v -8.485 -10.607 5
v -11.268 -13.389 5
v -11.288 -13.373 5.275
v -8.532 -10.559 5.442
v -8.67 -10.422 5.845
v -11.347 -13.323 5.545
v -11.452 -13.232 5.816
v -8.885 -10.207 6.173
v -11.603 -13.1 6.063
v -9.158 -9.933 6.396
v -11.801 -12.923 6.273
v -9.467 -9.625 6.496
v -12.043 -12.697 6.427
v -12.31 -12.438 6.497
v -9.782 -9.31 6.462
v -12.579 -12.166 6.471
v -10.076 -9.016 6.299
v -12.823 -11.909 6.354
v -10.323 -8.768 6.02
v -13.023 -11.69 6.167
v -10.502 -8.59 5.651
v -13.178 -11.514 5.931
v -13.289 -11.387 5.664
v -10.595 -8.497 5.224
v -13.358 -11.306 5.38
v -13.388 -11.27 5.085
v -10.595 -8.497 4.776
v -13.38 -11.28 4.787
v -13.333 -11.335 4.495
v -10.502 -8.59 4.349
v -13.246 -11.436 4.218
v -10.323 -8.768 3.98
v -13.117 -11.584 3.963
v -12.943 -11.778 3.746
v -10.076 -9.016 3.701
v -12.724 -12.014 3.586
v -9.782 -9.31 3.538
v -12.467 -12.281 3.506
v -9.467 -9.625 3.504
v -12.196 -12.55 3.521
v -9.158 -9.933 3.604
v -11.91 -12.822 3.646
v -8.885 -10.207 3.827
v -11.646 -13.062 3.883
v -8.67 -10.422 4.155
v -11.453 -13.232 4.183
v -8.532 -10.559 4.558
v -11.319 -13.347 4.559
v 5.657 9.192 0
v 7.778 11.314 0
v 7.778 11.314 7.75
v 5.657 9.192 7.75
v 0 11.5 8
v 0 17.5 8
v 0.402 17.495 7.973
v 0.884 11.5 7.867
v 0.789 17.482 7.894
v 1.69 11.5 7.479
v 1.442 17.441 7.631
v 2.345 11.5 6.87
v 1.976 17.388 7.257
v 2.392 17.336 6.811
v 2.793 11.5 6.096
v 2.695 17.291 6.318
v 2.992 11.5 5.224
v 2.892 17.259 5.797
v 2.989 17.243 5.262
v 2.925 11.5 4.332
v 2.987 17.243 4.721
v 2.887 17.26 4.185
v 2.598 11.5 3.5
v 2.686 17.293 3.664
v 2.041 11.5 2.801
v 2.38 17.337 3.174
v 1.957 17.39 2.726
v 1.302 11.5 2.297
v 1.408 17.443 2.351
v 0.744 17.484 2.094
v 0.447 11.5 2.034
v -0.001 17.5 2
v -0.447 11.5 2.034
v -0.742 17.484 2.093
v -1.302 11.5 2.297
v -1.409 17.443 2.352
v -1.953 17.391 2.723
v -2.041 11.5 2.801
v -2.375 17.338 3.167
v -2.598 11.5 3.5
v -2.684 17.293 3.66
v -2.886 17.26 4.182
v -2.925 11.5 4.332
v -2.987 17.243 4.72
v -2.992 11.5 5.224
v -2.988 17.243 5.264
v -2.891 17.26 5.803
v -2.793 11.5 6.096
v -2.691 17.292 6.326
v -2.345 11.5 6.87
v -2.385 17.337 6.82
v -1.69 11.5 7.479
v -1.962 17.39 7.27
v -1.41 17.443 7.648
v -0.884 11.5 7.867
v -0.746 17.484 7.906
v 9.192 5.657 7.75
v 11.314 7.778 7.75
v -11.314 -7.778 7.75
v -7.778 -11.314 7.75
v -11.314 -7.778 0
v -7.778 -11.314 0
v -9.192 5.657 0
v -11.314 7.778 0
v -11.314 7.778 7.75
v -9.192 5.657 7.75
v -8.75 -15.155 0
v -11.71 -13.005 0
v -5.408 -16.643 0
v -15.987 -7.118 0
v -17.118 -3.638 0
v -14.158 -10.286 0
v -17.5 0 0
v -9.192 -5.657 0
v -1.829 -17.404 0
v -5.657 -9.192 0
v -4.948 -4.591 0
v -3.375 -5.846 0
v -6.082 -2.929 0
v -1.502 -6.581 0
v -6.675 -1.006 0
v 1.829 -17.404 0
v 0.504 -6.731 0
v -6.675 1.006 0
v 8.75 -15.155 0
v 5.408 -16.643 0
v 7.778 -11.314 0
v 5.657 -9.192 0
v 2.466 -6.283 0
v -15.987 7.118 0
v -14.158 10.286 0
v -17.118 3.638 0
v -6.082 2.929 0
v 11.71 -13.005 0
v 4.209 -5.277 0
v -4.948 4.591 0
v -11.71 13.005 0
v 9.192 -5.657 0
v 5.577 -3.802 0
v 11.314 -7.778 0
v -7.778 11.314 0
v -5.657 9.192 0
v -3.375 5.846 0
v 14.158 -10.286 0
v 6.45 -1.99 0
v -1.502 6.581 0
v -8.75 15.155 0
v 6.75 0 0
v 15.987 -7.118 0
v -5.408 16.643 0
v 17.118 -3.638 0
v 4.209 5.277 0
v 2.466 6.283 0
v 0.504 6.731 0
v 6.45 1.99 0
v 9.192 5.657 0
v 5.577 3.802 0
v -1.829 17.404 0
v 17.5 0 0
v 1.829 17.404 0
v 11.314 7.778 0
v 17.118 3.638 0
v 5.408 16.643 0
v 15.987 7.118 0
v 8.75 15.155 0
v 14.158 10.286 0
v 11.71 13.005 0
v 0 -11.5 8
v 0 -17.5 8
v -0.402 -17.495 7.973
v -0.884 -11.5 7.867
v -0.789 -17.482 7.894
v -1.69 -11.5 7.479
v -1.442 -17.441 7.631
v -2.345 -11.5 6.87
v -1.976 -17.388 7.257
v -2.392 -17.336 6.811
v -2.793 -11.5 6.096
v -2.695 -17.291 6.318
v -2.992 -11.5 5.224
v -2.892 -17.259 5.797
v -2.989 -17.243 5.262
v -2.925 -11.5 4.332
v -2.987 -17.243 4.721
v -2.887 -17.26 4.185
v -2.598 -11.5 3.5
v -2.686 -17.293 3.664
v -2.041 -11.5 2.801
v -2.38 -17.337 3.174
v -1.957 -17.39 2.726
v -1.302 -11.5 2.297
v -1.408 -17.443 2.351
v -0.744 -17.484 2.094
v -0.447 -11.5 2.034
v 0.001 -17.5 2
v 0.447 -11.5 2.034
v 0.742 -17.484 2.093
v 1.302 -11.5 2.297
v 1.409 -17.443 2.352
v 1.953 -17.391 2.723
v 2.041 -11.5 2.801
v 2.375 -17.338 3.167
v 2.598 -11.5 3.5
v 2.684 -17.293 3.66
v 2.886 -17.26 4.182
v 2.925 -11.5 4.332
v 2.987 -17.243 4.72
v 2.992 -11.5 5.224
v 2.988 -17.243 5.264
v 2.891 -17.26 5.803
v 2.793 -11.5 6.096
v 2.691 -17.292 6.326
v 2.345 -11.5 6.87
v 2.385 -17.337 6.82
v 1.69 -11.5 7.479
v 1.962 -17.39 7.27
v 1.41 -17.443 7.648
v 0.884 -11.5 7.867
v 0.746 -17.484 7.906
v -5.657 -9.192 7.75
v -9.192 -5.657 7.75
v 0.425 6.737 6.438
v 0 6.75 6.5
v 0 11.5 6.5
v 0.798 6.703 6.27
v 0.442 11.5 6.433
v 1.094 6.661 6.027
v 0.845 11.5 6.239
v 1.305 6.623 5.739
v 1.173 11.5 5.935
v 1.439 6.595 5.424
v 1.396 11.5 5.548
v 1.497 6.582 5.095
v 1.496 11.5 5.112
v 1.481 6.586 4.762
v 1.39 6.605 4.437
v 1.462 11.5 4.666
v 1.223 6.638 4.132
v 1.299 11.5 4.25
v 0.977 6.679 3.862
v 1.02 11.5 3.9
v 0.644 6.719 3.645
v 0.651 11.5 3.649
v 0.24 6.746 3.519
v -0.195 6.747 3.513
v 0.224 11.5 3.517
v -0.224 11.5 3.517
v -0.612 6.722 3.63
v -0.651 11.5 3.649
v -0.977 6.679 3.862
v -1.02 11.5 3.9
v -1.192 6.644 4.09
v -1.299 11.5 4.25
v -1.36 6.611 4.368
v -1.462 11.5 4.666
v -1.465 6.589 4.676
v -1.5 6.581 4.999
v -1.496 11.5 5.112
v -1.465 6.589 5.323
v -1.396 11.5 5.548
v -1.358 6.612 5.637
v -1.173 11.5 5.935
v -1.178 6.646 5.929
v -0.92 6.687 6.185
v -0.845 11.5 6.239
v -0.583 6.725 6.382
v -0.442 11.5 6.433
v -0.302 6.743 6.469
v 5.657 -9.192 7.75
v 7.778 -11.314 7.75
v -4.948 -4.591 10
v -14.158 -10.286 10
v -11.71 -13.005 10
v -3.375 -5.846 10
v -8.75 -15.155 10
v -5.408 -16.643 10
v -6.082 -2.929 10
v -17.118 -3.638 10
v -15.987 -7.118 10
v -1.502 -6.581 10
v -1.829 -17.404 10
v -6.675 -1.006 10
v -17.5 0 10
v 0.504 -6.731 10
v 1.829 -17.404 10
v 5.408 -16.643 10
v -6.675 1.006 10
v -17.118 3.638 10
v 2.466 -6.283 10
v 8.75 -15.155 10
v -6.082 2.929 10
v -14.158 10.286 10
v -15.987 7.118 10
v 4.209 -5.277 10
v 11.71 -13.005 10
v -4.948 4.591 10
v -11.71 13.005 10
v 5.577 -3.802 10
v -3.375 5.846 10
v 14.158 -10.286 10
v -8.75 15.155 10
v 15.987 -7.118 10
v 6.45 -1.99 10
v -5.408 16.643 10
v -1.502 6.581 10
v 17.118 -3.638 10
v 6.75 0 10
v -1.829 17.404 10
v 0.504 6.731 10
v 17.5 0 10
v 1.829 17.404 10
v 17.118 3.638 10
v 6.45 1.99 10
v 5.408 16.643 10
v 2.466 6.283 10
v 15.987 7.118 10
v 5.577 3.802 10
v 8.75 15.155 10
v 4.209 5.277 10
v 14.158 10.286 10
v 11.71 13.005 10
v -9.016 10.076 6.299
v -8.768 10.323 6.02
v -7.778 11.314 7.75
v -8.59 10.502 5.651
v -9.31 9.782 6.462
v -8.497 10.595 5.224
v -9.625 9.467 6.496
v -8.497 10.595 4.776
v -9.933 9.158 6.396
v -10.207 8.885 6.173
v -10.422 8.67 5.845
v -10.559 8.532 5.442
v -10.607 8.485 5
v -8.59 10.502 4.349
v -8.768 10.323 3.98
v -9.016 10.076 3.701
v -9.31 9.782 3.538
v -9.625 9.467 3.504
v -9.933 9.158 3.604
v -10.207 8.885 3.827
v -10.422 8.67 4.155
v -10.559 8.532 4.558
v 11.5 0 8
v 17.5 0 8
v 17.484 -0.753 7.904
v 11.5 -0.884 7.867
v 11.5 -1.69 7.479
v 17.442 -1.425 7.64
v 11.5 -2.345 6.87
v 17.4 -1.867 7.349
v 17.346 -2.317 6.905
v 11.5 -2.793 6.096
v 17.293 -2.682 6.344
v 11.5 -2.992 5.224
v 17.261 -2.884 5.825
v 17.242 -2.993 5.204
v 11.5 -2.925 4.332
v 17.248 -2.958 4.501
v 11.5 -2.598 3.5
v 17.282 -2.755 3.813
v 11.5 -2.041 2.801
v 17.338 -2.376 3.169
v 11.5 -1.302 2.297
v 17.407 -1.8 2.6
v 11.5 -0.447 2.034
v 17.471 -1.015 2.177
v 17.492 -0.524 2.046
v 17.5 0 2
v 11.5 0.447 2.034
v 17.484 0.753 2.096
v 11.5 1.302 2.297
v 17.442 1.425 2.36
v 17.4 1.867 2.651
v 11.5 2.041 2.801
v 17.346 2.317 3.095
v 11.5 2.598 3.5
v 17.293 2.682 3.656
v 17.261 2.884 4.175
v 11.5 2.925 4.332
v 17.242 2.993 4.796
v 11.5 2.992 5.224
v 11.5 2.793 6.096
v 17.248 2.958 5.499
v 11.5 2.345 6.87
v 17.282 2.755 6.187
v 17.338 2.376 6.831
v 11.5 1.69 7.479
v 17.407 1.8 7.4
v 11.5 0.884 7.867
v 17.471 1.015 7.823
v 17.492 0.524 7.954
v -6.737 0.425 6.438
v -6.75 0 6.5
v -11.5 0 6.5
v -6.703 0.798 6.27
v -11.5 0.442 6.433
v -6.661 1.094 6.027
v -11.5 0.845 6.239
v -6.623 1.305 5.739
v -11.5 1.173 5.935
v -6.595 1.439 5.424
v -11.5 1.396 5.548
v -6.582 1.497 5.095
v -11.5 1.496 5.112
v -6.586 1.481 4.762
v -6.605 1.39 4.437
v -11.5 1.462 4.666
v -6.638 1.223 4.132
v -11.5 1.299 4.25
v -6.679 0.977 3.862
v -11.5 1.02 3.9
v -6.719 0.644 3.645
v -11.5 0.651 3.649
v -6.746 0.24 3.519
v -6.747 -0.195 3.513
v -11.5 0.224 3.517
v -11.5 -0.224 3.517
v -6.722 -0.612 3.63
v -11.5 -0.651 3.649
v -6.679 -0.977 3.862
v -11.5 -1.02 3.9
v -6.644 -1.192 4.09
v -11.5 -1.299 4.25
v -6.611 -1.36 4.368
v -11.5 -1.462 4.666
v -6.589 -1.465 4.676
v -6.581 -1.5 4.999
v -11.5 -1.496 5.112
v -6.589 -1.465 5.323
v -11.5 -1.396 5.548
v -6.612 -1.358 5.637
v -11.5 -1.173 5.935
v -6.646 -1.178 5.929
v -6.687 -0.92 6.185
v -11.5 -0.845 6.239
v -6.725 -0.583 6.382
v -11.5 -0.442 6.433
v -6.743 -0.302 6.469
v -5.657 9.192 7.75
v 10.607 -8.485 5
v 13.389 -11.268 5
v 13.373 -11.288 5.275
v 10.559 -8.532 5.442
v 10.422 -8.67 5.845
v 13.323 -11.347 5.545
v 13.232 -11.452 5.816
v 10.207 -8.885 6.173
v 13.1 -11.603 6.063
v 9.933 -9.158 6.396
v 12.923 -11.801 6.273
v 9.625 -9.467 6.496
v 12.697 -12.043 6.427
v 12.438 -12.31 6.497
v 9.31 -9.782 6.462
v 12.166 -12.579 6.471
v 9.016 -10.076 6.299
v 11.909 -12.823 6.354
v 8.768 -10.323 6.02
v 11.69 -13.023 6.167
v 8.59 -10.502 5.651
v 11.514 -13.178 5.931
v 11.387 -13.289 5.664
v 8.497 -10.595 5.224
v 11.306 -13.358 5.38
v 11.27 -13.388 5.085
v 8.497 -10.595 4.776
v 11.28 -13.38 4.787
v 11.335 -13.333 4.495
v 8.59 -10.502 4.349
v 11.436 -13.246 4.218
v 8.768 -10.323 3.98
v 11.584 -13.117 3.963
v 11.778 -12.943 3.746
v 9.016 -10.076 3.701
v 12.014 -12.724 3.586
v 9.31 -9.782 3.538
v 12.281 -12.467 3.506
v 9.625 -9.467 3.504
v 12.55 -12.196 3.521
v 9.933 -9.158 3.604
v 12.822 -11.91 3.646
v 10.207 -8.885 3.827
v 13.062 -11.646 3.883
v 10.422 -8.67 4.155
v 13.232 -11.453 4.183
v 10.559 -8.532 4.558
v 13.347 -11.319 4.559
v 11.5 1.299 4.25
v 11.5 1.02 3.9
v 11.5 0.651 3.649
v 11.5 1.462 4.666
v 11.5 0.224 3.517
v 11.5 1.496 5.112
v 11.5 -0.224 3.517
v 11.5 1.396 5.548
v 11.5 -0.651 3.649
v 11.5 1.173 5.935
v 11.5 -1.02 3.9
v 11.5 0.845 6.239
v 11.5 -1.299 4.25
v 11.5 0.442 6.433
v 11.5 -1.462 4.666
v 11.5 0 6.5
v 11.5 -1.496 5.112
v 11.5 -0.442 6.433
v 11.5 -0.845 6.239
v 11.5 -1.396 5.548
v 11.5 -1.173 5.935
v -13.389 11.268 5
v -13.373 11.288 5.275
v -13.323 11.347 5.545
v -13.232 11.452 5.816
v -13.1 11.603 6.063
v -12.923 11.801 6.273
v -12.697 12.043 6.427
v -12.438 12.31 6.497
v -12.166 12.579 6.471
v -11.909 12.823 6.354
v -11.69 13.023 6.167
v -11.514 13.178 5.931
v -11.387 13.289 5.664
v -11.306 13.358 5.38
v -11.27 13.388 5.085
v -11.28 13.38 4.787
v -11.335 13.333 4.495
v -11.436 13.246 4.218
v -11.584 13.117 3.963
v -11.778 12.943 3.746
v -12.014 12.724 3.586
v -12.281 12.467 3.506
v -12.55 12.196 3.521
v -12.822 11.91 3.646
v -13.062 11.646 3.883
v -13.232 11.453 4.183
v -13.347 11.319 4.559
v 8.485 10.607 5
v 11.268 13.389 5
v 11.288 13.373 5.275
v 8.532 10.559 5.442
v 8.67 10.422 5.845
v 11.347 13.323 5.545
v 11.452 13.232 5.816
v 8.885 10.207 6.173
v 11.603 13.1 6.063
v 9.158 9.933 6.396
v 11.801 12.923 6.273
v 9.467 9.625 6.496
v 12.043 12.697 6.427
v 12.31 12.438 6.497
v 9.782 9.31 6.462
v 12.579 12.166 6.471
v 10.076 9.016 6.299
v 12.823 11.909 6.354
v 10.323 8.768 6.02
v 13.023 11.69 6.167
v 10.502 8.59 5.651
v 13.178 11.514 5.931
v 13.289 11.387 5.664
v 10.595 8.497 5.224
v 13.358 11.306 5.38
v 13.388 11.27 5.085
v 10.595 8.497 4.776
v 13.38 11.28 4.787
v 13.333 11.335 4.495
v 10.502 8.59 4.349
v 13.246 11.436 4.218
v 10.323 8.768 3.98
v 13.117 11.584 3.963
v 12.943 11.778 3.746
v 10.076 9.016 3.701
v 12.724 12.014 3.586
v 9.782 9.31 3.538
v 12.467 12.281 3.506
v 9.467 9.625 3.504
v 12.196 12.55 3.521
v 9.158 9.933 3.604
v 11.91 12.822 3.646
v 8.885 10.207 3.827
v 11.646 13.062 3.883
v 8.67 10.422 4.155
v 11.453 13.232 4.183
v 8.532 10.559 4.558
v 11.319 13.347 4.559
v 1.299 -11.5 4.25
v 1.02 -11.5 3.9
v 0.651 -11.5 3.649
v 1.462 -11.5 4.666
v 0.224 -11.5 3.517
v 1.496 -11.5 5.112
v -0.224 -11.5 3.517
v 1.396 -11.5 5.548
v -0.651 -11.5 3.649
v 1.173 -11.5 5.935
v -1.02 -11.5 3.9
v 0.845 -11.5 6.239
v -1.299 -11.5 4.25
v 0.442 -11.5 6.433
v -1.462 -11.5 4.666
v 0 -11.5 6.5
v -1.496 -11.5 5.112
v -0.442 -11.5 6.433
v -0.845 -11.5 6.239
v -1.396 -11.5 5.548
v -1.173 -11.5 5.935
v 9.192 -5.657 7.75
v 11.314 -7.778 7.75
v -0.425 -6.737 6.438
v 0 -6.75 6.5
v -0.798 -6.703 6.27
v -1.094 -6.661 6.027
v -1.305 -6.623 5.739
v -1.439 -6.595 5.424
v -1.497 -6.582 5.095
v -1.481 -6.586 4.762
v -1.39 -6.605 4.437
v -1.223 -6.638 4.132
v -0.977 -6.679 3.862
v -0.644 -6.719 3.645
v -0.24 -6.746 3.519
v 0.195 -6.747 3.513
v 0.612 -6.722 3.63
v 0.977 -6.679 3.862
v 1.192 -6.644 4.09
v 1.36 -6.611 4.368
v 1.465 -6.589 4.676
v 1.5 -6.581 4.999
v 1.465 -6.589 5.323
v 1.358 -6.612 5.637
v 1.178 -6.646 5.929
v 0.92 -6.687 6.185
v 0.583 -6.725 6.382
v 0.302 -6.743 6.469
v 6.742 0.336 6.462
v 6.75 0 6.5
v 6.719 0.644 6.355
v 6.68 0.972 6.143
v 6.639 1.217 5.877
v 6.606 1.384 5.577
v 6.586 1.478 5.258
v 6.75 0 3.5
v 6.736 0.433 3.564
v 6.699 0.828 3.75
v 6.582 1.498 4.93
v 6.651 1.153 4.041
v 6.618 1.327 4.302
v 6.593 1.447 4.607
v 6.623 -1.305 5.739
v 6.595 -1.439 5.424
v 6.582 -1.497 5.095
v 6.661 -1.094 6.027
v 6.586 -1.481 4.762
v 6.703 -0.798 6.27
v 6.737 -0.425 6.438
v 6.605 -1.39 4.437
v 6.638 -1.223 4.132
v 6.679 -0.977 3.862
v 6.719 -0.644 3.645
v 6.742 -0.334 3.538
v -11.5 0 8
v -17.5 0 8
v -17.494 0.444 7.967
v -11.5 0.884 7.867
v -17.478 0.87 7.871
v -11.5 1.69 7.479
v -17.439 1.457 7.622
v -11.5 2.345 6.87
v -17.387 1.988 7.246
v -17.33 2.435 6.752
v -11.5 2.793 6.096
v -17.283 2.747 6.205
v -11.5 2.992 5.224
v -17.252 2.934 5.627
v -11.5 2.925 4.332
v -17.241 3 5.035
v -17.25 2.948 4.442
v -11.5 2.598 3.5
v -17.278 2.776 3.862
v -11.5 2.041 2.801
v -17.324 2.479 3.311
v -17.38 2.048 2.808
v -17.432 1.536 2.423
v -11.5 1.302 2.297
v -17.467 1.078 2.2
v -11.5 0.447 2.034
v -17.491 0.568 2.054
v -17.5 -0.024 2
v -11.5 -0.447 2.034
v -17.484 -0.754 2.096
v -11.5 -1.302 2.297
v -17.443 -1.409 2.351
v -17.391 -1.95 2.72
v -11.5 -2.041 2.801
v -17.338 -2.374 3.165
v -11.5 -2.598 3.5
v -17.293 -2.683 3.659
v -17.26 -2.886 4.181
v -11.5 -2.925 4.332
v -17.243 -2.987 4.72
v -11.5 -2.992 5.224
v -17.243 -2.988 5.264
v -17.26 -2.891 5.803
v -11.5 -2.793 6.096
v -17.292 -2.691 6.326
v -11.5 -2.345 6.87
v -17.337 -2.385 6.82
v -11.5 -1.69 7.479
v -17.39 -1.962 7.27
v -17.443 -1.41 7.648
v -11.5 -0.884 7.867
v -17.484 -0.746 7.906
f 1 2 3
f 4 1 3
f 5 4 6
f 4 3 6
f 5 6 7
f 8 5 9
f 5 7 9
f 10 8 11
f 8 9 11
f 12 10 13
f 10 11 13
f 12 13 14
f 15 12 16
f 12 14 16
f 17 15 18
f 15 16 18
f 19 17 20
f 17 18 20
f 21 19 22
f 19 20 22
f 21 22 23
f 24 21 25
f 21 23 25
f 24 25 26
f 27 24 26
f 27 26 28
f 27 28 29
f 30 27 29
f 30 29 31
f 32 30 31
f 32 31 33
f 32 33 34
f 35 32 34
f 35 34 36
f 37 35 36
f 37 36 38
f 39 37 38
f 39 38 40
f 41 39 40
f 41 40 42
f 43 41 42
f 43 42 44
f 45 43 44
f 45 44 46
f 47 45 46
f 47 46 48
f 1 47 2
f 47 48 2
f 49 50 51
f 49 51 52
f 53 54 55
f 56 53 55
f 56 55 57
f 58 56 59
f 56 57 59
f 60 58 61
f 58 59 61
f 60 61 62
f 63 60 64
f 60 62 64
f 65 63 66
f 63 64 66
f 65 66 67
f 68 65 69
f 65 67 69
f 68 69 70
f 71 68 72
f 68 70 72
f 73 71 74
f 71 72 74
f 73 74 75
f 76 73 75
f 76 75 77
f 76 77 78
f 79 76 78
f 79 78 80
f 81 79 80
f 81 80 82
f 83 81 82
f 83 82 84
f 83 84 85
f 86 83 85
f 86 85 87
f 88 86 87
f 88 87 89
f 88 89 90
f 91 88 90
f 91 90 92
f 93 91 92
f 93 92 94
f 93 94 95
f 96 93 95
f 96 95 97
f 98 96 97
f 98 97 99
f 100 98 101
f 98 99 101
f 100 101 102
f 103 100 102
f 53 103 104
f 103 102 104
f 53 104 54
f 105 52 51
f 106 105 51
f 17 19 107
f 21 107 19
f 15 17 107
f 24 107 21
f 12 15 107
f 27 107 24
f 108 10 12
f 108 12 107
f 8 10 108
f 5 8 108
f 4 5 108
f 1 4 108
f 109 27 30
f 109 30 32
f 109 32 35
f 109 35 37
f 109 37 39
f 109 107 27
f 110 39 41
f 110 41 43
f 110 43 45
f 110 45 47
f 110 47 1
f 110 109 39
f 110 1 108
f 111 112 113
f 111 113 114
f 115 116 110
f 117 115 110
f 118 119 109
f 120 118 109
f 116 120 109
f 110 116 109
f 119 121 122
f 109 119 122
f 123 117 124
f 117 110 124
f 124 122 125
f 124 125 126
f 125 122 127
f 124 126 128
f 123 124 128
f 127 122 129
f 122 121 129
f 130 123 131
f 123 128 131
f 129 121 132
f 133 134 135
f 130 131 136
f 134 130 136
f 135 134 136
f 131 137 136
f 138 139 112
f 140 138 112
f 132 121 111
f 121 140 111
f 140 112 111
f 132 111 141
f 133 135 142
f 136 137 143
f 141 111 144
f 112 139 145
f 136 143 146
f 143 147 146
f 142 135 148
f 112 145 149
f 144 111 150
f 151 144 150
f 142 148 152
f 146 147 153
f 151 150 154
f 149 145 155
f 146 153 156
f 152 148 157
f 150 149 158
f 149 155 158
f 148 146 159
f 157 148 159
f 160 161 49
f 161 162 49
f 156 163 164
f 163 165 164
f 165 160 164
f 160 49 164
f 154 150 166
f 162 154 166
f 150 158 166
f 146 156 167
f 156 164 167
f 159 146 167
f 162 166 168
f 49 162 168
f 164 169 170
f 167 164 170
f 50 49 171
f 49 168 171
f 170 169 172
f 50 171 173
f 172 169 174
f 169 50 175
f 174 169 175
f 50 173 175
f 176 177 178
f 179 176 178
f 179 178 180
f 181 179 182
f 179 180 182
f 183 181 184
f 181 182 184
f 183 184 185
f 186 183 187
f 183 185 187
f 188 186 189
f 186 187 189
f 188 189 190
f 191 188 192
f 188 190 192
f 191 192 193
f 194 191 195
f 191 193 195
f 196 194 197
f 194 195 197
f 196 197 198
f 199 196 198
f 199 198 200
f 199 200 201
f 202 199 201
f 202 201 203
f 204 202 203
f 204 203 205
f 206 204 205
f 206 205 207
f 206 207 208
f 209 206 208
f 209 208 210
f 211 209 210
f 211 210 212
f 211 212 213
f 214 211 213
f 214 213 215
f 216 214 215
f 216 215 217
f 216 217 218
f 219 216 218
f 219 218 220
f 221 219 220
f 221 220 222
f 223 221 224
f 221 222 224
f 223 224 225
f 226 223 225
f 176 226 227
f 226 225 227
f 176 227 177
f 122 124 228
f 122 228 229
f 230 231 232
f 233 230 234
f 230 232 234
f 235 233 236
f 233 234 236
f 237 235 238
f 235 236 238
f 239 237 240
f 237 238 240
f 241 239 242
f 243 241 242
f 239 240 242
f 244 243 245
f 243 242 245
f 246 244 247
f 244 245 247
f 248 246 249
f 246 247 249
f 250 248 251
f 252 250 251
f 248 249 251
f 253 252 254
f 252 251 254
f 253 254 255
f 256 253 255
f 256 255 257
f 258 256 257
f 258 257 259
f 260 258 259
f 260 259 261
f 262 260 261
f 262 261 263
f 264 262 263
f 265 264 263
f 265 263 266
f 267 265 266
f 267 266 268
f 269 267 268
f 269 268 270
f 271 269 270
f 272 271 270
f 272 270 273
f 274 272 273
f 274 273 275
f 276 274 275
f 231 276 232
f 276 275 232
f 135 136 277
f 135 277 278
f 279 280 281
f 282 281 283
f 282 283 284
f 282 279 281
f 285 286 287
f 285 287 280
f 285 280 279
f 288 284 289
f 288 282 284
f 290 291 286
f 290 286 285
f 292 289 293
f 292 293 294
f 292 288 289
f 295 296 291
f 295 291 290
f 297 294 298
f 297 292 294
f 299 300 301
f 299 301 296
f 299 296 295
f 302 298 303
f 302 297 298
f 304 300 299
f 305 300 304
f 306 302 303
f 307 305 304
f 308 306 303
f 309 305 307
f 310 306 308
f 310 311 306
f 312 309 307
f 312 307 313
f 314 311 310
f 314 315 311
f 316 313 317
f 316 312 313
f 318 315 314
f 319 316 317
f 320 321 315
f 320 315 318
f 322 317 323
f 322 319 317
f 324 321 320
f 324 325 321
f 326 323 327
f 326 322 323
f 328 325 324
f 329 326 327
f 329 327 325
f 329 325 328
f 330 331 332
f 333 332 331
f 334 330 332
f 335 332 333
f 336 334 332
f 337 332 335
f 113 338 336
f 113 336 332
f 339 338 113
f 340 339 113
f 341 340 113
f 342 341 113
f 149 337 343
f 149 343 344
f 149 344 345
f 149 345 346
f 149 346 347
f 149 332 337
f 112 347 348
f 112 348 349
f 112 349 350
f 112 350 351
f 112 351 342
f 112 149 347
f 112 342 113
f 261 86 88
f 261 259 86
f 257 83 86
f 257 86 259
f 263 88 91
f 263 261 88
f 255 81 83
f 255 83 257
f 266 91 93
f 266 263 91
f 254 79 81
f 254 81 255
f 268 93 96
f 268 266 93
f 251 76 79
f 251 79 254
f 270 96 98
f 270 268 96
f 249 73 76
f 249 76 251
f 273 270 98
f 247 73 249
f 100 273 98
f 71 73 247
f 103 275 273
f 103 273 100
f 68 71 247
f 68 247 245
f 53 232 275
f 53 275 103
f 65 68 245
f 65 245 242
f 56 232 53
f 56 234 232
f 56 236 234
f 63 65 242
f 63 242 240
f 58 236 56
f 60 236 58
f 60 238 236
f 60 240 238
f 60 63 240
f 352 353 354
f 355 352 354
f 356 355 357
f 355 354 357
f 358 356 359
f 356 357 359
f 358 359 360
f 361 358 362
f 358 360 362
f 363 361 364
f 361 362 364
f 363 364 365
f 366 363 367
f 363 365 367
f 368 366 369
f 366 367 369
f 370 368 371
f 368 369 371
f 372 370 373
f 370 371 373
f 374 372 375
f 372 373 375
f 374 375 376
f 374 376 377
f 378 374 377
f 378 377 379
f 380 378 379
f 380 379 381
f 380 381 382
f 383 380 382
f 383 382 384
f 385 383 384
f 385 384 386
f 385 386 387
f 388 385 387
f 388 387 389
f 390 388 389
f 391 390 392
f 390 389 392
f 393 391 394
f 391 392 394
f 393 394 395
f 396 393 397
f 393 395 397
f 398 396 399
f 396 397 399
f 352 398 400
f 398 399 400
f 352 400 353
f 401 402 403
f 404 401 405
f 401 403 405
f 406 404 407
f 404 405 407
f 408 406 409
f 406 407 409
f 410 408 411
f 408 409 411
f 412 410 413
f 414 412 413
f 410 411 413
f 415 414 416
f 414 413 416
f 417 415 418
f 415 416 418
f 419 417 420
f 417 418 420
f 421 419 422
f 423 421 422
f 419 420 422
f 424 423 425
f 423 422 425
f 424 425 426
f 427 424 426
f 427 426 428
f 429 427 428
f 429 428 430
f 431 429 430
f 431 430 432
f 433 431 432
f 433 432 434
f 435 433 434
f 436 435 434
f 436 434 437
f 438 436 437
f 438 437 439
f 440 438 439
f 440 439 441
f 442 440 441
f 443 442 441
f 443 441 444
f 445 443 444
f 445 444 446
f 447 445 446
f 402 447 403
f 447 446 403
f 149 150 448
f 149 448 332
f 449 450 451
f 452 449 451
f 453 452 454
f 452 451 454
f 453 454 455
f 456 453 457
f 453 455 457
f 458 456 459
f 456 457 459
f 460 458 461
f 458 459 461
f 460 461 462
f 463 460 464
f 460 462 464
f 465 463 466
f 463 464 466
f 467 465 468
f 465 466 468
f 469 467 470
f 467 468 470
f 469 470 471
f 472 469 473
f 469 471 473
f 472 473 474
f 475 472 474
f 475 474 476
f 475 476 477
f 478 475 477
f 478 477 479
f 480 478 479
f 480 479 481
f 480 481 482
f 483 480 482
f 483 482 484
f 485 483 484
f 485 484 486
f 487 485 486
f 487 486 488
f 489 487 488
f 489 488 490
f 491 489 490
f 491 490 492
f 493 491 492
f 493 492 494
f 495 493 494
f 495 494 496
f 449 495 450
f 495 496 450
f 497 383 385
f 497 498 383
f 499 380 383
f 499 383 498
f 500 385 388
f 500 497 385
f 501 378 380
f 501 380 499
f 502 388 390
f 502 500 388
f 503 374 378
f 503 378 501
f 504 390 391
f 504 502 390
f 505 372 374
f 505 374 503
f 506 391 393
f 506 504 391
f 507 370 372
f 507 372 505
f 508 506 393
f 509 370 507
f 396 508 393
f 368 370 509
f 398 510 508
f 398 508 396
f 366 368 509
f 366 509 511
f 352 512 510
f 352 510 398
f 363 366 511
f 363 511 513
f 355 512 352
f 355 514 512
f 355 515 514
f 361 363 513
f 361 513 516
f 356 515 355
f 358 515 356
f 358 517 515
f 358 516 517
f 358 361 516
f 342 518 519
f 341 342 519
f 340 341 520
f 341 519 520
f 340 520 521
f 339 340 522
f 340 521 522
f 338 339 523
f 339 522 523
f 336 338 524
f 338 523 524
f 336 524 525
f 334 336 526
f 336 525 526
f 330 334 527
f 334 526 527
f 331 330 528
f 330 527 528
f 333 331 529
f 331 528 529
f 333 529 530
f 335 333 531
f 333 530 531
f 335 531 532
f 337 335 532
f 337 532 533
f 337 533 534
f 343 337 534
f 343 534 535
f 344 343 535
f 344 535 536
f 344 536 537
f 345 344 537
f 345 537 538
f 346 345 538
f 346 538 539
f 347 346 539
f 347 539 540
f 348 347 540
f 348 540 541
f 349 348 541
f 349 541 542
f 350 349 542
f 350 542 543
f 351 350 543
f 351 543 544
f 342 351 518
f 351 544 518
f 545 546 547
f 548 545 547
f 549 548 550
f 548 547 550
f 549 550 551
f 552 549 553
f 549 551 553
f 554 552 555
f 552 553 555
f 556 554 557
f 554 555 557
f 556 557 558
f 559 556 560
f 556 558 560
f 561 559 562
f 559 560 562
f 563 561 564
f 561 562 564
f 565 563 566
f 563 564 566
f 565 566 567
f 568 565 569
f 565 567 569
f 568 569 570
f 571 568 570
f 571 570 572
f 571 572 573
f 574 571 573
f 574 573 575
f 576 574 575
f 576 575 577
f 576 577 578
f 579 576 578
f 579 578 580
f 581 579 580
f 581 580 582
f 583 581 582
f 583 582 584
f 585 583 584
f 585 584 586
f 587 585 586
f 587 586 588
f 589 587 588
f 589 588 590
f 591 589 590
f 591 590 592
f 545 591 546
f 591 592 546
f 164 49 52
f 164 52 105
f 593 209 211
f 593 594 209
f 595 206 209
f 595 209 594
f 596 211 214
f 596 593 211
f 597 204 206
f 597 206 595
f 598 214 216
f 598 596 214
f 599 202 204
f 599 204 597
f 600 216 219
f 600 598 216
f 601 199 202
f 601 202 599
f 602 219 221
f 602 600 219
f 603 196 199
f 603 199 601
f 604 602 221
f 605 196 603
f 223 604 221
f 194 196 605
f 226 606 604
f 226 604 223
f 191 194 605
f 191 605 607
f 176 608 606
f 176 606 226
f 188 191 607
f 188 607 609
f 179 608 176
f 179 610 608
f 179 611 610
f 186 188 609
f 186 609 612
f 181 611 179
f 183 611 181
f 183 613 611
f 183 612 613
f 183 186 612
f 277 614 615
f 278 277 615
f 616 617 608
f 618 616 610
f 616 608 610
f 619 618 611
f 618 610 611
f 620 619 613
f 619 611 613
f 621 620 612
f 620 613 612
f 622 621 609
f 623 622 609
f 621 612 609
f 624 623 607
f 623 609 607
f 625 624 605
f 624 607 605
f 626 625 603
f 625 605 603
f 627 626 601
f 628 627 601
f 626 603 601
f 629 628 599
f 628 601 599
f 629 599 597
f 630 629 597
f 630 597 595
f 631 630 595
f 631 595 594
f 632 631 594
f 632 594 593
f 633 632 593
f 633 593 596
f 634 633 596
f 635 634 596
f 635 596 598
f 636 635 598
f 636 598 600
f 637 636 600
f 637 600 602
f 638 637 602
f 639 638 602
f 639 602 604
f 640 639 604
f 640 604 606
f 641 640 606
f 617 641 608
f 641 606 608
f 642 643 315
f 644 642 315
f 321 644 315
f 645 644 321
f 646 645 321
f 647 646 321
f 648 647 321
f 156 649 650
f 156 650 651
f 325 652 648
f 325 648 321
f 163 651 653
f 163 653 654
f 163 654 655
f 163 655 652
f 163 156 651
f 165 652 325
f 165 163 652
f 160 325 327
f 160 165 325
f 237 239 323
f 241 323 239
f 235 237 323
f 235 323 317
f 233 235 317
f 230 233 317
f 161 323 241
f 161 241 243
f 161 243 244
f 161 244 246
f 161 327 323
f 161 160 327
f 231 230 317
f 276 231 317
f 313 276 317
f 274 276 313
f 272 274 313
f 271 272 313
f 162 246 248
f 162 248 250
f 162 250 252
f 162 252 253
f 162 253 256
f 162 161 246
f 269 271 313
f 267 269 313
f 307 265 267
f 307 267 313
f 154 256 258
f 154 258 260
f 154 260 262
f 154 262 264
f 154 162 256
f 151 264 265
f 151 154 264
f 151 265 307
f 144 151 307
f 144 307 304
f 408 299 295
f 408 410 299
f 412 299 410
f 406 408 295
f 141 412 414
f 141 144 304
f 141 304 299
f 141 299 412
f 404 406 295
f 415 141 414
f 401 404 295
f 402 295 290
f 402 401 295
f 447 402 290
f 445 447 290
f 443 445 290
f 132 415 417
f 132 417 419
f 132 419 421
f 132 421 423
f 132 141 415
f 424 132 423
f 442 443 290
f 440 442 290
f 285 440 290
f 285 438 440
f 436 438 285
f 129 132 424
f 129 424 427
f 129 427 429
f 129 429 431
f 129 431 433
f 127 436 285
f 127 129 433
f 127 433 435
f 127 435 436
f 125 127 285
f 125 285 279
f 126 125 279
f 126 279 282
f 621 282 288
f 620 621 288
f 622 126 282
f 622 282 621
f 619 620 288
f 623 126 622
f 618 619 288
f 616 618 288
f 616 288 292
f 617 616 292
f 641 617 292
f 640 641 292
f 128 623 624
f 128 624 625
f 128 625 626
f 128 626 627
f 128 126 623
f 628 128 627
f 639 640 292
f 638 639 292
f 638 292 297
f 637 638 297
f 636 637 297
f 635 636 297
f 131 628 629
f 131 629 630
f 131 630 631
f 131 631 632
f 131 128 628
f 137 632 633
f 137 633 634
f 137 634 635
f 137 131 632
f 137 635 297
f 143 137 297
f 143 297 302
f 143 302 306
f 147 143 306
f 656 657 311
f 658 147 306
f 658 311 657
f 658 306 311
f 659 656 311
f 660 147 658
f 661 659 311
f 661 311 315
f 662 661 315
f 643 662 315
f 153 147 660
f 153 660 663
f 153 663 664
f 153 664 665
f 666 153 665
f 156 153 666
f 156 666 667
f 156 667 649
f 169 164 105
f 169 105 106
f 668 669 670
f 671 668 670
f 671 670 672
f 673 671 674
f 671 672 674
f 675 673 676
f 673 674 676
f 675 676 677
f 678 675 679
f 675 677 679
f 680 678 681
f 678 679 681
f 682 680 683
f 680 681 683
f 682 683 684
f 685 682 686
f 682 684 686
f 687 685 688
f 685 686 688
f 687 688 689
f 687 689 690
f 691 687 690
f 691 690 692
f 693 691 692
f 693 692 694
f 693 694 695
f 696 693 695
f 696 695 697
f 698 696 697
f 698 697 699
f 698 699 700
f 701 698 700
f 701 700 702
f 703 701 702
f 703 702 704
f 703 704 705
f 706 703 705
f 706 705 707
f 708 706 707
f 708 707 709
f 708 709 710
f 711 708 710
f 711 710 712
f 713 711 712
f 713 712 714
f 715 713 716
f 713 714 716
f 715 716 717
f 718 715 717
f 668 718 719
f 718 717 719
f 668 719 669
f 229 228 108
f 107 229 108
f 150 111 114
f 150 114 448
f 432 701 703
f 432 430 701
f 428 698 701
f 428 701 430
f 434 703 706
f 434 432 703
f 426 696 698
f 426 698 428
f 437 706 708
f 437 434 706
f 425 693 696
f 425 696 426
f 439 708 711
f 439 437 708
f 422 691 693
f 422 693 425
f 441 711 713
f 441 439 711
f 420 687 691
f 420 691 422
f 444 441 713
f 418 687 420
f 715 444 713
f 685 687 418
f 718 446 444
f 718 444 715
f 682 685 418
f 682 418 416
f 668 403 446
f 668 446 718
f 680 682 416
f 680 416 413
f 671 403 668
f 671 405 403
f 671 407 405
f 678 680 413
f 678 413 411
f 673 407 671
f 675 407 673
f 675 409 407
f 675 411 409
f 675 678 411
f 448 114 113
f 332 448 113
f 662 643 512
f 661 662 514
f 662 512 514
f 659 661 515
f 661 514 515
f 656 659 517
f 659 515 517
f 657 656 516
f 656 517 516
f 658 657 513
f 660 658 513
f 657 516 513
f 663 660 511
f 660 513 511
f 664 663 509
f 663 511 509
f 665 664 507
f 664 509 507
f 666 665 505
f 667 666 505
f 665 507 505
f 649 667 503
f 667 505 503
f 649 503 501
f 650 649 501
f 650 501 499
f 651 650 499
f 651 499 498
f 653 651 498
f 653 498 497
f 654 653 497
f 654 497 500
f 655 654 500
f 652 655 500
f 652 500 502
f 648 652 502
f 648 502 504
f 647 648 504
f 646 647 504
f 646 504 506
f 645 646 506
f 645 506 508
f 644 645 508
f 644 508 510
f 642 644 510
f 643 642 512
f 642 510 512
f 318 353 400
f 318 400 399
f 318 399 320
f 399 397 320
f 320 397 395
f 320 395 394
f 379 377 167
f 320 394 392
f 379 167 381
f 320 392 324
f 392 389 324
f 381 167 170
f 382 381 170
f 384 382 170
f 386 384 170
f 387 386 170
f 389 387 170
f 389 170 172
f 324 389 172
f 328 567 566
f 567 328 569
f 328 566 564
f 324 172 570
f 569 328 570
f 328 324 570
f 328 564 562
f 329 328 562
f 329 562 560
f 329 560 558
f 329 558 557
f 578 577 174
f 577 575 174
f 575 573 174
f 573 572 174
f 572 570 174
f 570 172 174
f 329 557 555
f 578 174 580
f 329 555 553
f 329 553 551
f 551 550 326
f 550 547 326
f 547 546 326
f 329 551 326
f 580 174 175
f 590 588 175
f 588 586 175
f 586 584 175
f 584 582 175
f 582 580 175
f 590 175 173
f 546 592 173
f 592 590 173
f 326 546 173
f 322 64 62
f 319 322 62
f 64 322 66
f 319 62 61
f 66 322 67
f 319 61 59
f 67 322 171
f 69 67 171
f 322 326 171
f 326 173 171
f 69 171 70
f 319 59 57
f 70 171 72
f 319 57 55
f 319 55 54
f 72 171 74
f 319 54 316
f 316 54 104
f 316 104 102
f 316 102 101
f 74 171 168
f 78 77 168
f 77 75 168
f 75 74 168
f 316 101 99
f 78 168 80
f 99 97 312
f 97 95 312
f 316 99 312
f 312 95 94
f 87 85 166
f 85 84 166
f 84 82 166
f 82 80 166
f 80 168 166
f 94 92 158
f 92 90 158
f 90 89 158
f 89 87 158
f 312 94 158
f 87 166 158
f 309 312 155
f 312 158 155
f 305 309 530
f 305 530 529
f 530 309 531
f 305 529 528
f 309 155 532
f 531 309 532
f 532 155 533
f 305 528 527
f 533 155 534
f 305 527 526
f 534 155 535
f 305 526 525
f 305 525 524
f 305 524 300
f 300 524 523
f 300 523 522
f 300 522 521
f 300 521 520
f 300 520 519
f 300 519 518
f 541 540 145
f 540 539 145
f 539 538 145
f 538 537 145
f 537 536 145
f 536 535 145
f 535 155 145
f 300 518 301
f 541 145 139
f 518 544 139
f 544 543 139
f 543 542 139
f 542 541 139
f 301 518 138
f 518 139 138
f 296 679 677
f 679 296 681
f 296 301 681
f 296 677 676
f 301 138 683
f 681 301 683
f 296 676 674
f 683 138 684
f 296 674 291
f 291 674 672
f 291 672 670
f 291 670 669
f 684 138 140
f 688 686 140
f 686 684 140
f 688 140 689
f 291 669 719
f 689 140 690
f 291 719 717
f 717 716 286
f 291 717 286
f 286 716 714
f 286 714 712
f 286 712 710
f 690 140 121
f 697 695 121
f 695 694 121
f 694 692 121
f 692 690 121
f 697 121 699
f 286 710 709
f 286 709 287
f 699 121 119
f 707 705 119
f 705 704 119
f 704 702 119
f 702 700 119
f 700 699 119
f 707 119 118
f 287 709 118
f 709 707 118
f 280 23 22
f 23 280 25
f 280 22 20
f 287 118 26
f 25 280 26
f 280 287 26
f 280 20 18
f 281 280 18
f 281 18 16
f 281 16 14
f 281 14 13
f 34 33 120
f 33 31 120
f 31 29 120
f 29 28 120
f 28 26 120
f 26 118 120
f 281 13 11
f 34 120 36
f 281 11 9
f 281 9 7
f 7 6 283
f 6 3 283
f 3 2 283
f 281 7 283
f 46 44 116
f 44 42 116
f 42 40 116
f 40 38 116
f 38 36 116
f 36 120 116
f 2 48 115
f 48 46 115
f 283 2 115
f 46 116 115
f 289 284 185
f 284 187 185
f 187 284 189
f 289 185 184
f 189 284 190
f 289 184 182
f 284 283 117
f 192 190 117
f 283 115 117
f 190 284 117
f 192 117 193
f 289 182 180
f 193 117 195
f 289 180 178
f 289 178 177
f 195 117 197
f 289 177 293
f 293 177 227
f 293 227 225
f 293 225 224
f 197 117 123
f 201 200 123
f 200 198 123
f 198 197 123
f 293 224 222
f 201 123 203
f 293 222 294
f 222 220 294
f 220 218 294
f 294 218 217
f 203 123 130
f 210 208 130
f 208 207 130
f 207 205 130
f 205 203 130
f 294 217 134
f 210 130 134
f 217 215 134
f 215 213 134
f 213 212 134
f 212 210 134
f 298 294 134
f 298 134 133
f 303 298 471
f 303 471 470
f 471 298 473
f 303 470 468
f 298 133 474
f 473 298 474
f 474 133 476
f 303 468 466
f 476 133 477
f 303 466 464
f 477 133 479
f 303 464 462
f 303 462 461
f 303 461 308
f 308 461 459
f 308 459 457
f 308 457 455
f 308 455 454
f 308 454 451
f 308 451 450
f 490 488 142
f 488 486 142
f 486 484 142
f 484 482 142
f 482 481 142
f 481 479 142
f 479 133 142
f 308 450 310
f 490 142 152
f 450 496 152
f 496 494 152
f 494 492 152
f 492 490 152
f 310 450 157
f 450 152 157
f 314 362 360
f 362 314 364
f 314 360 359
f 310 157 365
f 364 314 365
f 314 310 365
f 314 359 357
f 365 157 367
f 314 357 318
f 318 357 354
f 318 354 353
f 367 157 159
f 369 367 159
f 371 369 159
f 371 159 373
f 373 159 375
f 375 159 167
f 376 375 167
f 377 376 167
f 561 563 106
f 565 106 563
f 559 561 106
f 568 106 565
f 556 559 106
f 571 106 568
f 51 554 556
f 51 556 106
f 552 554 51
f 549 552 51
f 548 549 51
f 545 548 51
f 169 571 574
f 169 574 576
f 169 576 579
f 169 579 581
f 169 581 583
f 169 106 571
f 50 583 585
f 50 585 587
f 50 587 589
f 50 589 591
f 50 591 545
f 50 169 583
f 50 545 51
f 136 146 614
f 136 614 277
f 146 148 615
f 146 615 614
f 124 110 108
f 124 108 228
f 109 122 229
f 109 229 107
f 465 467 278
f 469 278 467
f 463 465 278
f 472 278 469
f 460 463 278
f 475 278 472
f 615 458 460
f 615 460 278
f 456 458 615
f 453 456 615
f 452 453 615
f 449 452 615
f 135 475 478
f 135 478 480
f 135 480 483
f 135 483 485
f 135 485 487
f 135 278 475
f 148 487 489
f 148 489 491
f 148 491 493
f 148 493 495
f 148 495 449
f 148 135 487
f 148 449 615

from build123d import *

# Parameters (mm, degrees)
ESBO_O1_R                  = 17.5
ESBO_O1_R_2                = 6.75
RESSALTO_EXTRUS_O1_DEPTH   = 10
ESBO_O2_R                  = 3
ESBO_O2_R_2                = 1.5
CORTE_EXTRUS_O1_DEPTH      = 6
CORTE_EXTRUS_O2_REACH      = 42.389
CORTE_EXTRUS_O2_END_RADIUS = 6.75
ESBO_O2_3_R                = 1.5
PADR_OCIRCULAR1_COUNT      = 4
ESBO_O5_R                  = 1.5
CORTE_EXTRUS_O3_DEPTH      = 5
PADR_OCIRCULAR2_COUNT      = 4
CORTE_EXTRUS_O4_DEPTH      = 7.75
PADR_OCIRCULAR3_COUNT      = 4


with BuildPart() as part:
    # Esbo_o1 → Ressalto-extrus_o1 (new body)
    with BuildSketch(Plane.XY):
        Circle(ESBO_O1_R)
        Circle(ESBO_O1_R_2, mode=Mode.SUBTRACT)
    extrude(amount=RESSALTO_EXTRUS_O1_DEPTH)

    # Esbo_o2 → Corte-extrus_o1 (cut)
    # profile 1 of 2: a face of its own
    with BuildSketch(Plane(origin=(0, 17.5, 0), x_dir=(1, 0, 0), z_dir=(0, 1, 0))):
        with Locations(Location((0, -5, 0), (0, 0, 270))):
            Circle(ESBO_O2_R)
        with Locations((0, -5)):
            Circle(ESBO_O2_R_2, mode=Mode.SUBTRACT)
    # profile 2 of 2: a face of its own
    with BuildSketch(Plane(origin=(0, 17.5, 0), x_dir=(1, 0, 0), z_dir=(0, 1, 0))):
        with Locations((0, -5)):
            Circle(ESBO_O2_R_2)
    corte_extrus_o1 = extrude(amount=-CORTE_EXTRUS_O1_DEPTH, mode=Mode.SUBTRACT)

    # Corte-extrus_o2: up to this cylinder (the profile starts outside it)
    corte_extrus_o2_end = Plane(origin=(0, 0, 5), z_dir=(0, 0, -1)) * Cylinder(CORTE_EXTRUS_O2_END_RADIUS, 99.278, mode=Mode.PRIVATE)
    # Esbo_o2_3 → Corte-extrus_o2 (cut, up to the surface)
    with BuildSketch(Plane(origin=(0, 17.5, 0), x_dir=(1, 0, 0), z_dir=(0, 1, 0)), mode=Mode.PRIVATE) as corte_extrus_o2_sk1:
        with Locations(Location((0, -5, 0), (0, 0, 270))):
            Circle(ESBO_O2_3_R)
    corte_extrus_o2_tool1 = extrude(corte_extrus_o2_sk1.sketch, amount=-CORTE_EXTRUS_O2_REACH, mode=Mode.PRIVATE) - corte_extrus_o2_end
    corte_extrus_o2 = corte_extrus_o2_tool1.solids().sort_by_distance((0, 17.5, 5))[0]
    add(corte_extrus_o2, mode=Mode.SUBTRACT)

    # Padr_oCircular1: Corte-extrus_o1, Corte-extrus_o2 ×4 about axis
    padr_ocircular1_axis = Axis((0, 0, 0), (0, 0, 1))
    add([corte_extrus_o1.rotate(padr_ocircular1_axis, i * 360 / PADR_OCIRCULAR1_COUNT) for i in range(1, PADR_OCIRCULAR1_COUNT)], mode=Mode.SUBTRACT)
    add([corte_extrus_o2.rotate(padr_ocircular1_axis, i * 360 / PADR_OCIRCULAR1_COUNT) for i in range(1, PADR_OCIRCULAR1_COUNT)], mode=Mode.SUBTRACT)

    # Esbo_o5 → Corte-extrus_o3 (cut)
    with BuildSketch(Plane(origin=(-12.374368671, 12.374368671, 0), x_dir=(0, 0, -1), z_dir=(-0.7071067811865488, 0.7071067811865464, 0))):
        with Locations(Location((-5, 0, 0), (0, 0, 90))):
            Circle(ESBO_O5_R)
    corte_extrus_o3 = extrude(amount=-CORTE_EXTRUS_O3_DEPTH, mode=Mode.SUBTRACT)

    # Padr_oCircular2: Corte-extrus_o3 ×4 about axis
    padr_ocircular2_axis = Axis((0, 0, 0), (0, 0, 1))
    for i in range(1, PADR_OCIRCULAR2_COUNT):
        add(corte_extrus_o3.rotate(padr_ocircular2_axis, i * 360 / PADR_OCIRCULAR2_COUNT), mode=Mode.SUBTRACT)

    # Esbo_o6 → Corte-extrus_o4 (cut)
    with BuildSketch(Plane(origin=(0, 0, 0), x_dir=(-1, 0, 0), z_dir=(0, 0, -1))):
        Polygon((-11.313708499, 7.778174593), (-7.778174593, 11.313708499), (-5.656854249, 9.192388155), (-9.192388155, 5.656854249), align=None)
    corte_extrus_o4 = extrude(amount=-CORTE_EXTRUS_O4_DEPTH, mode=Mode.SUBTRACT)

    # Padr_oCircular3: Corte-extrus_o4 ×4 about axis
    padr_ocircular3_axis = Axis((0, 0, 0), (0, 0, 1))
    for i in range(1, PADR_OCIRCULAR3_COUNT):
        add(corte_extrus_o4.rotate(padr_ocircular3_axis, i * 360 / PADR_OCIRCULAR3_COUNT), mode=Mode.SUBTRACT)


solid = part.part
